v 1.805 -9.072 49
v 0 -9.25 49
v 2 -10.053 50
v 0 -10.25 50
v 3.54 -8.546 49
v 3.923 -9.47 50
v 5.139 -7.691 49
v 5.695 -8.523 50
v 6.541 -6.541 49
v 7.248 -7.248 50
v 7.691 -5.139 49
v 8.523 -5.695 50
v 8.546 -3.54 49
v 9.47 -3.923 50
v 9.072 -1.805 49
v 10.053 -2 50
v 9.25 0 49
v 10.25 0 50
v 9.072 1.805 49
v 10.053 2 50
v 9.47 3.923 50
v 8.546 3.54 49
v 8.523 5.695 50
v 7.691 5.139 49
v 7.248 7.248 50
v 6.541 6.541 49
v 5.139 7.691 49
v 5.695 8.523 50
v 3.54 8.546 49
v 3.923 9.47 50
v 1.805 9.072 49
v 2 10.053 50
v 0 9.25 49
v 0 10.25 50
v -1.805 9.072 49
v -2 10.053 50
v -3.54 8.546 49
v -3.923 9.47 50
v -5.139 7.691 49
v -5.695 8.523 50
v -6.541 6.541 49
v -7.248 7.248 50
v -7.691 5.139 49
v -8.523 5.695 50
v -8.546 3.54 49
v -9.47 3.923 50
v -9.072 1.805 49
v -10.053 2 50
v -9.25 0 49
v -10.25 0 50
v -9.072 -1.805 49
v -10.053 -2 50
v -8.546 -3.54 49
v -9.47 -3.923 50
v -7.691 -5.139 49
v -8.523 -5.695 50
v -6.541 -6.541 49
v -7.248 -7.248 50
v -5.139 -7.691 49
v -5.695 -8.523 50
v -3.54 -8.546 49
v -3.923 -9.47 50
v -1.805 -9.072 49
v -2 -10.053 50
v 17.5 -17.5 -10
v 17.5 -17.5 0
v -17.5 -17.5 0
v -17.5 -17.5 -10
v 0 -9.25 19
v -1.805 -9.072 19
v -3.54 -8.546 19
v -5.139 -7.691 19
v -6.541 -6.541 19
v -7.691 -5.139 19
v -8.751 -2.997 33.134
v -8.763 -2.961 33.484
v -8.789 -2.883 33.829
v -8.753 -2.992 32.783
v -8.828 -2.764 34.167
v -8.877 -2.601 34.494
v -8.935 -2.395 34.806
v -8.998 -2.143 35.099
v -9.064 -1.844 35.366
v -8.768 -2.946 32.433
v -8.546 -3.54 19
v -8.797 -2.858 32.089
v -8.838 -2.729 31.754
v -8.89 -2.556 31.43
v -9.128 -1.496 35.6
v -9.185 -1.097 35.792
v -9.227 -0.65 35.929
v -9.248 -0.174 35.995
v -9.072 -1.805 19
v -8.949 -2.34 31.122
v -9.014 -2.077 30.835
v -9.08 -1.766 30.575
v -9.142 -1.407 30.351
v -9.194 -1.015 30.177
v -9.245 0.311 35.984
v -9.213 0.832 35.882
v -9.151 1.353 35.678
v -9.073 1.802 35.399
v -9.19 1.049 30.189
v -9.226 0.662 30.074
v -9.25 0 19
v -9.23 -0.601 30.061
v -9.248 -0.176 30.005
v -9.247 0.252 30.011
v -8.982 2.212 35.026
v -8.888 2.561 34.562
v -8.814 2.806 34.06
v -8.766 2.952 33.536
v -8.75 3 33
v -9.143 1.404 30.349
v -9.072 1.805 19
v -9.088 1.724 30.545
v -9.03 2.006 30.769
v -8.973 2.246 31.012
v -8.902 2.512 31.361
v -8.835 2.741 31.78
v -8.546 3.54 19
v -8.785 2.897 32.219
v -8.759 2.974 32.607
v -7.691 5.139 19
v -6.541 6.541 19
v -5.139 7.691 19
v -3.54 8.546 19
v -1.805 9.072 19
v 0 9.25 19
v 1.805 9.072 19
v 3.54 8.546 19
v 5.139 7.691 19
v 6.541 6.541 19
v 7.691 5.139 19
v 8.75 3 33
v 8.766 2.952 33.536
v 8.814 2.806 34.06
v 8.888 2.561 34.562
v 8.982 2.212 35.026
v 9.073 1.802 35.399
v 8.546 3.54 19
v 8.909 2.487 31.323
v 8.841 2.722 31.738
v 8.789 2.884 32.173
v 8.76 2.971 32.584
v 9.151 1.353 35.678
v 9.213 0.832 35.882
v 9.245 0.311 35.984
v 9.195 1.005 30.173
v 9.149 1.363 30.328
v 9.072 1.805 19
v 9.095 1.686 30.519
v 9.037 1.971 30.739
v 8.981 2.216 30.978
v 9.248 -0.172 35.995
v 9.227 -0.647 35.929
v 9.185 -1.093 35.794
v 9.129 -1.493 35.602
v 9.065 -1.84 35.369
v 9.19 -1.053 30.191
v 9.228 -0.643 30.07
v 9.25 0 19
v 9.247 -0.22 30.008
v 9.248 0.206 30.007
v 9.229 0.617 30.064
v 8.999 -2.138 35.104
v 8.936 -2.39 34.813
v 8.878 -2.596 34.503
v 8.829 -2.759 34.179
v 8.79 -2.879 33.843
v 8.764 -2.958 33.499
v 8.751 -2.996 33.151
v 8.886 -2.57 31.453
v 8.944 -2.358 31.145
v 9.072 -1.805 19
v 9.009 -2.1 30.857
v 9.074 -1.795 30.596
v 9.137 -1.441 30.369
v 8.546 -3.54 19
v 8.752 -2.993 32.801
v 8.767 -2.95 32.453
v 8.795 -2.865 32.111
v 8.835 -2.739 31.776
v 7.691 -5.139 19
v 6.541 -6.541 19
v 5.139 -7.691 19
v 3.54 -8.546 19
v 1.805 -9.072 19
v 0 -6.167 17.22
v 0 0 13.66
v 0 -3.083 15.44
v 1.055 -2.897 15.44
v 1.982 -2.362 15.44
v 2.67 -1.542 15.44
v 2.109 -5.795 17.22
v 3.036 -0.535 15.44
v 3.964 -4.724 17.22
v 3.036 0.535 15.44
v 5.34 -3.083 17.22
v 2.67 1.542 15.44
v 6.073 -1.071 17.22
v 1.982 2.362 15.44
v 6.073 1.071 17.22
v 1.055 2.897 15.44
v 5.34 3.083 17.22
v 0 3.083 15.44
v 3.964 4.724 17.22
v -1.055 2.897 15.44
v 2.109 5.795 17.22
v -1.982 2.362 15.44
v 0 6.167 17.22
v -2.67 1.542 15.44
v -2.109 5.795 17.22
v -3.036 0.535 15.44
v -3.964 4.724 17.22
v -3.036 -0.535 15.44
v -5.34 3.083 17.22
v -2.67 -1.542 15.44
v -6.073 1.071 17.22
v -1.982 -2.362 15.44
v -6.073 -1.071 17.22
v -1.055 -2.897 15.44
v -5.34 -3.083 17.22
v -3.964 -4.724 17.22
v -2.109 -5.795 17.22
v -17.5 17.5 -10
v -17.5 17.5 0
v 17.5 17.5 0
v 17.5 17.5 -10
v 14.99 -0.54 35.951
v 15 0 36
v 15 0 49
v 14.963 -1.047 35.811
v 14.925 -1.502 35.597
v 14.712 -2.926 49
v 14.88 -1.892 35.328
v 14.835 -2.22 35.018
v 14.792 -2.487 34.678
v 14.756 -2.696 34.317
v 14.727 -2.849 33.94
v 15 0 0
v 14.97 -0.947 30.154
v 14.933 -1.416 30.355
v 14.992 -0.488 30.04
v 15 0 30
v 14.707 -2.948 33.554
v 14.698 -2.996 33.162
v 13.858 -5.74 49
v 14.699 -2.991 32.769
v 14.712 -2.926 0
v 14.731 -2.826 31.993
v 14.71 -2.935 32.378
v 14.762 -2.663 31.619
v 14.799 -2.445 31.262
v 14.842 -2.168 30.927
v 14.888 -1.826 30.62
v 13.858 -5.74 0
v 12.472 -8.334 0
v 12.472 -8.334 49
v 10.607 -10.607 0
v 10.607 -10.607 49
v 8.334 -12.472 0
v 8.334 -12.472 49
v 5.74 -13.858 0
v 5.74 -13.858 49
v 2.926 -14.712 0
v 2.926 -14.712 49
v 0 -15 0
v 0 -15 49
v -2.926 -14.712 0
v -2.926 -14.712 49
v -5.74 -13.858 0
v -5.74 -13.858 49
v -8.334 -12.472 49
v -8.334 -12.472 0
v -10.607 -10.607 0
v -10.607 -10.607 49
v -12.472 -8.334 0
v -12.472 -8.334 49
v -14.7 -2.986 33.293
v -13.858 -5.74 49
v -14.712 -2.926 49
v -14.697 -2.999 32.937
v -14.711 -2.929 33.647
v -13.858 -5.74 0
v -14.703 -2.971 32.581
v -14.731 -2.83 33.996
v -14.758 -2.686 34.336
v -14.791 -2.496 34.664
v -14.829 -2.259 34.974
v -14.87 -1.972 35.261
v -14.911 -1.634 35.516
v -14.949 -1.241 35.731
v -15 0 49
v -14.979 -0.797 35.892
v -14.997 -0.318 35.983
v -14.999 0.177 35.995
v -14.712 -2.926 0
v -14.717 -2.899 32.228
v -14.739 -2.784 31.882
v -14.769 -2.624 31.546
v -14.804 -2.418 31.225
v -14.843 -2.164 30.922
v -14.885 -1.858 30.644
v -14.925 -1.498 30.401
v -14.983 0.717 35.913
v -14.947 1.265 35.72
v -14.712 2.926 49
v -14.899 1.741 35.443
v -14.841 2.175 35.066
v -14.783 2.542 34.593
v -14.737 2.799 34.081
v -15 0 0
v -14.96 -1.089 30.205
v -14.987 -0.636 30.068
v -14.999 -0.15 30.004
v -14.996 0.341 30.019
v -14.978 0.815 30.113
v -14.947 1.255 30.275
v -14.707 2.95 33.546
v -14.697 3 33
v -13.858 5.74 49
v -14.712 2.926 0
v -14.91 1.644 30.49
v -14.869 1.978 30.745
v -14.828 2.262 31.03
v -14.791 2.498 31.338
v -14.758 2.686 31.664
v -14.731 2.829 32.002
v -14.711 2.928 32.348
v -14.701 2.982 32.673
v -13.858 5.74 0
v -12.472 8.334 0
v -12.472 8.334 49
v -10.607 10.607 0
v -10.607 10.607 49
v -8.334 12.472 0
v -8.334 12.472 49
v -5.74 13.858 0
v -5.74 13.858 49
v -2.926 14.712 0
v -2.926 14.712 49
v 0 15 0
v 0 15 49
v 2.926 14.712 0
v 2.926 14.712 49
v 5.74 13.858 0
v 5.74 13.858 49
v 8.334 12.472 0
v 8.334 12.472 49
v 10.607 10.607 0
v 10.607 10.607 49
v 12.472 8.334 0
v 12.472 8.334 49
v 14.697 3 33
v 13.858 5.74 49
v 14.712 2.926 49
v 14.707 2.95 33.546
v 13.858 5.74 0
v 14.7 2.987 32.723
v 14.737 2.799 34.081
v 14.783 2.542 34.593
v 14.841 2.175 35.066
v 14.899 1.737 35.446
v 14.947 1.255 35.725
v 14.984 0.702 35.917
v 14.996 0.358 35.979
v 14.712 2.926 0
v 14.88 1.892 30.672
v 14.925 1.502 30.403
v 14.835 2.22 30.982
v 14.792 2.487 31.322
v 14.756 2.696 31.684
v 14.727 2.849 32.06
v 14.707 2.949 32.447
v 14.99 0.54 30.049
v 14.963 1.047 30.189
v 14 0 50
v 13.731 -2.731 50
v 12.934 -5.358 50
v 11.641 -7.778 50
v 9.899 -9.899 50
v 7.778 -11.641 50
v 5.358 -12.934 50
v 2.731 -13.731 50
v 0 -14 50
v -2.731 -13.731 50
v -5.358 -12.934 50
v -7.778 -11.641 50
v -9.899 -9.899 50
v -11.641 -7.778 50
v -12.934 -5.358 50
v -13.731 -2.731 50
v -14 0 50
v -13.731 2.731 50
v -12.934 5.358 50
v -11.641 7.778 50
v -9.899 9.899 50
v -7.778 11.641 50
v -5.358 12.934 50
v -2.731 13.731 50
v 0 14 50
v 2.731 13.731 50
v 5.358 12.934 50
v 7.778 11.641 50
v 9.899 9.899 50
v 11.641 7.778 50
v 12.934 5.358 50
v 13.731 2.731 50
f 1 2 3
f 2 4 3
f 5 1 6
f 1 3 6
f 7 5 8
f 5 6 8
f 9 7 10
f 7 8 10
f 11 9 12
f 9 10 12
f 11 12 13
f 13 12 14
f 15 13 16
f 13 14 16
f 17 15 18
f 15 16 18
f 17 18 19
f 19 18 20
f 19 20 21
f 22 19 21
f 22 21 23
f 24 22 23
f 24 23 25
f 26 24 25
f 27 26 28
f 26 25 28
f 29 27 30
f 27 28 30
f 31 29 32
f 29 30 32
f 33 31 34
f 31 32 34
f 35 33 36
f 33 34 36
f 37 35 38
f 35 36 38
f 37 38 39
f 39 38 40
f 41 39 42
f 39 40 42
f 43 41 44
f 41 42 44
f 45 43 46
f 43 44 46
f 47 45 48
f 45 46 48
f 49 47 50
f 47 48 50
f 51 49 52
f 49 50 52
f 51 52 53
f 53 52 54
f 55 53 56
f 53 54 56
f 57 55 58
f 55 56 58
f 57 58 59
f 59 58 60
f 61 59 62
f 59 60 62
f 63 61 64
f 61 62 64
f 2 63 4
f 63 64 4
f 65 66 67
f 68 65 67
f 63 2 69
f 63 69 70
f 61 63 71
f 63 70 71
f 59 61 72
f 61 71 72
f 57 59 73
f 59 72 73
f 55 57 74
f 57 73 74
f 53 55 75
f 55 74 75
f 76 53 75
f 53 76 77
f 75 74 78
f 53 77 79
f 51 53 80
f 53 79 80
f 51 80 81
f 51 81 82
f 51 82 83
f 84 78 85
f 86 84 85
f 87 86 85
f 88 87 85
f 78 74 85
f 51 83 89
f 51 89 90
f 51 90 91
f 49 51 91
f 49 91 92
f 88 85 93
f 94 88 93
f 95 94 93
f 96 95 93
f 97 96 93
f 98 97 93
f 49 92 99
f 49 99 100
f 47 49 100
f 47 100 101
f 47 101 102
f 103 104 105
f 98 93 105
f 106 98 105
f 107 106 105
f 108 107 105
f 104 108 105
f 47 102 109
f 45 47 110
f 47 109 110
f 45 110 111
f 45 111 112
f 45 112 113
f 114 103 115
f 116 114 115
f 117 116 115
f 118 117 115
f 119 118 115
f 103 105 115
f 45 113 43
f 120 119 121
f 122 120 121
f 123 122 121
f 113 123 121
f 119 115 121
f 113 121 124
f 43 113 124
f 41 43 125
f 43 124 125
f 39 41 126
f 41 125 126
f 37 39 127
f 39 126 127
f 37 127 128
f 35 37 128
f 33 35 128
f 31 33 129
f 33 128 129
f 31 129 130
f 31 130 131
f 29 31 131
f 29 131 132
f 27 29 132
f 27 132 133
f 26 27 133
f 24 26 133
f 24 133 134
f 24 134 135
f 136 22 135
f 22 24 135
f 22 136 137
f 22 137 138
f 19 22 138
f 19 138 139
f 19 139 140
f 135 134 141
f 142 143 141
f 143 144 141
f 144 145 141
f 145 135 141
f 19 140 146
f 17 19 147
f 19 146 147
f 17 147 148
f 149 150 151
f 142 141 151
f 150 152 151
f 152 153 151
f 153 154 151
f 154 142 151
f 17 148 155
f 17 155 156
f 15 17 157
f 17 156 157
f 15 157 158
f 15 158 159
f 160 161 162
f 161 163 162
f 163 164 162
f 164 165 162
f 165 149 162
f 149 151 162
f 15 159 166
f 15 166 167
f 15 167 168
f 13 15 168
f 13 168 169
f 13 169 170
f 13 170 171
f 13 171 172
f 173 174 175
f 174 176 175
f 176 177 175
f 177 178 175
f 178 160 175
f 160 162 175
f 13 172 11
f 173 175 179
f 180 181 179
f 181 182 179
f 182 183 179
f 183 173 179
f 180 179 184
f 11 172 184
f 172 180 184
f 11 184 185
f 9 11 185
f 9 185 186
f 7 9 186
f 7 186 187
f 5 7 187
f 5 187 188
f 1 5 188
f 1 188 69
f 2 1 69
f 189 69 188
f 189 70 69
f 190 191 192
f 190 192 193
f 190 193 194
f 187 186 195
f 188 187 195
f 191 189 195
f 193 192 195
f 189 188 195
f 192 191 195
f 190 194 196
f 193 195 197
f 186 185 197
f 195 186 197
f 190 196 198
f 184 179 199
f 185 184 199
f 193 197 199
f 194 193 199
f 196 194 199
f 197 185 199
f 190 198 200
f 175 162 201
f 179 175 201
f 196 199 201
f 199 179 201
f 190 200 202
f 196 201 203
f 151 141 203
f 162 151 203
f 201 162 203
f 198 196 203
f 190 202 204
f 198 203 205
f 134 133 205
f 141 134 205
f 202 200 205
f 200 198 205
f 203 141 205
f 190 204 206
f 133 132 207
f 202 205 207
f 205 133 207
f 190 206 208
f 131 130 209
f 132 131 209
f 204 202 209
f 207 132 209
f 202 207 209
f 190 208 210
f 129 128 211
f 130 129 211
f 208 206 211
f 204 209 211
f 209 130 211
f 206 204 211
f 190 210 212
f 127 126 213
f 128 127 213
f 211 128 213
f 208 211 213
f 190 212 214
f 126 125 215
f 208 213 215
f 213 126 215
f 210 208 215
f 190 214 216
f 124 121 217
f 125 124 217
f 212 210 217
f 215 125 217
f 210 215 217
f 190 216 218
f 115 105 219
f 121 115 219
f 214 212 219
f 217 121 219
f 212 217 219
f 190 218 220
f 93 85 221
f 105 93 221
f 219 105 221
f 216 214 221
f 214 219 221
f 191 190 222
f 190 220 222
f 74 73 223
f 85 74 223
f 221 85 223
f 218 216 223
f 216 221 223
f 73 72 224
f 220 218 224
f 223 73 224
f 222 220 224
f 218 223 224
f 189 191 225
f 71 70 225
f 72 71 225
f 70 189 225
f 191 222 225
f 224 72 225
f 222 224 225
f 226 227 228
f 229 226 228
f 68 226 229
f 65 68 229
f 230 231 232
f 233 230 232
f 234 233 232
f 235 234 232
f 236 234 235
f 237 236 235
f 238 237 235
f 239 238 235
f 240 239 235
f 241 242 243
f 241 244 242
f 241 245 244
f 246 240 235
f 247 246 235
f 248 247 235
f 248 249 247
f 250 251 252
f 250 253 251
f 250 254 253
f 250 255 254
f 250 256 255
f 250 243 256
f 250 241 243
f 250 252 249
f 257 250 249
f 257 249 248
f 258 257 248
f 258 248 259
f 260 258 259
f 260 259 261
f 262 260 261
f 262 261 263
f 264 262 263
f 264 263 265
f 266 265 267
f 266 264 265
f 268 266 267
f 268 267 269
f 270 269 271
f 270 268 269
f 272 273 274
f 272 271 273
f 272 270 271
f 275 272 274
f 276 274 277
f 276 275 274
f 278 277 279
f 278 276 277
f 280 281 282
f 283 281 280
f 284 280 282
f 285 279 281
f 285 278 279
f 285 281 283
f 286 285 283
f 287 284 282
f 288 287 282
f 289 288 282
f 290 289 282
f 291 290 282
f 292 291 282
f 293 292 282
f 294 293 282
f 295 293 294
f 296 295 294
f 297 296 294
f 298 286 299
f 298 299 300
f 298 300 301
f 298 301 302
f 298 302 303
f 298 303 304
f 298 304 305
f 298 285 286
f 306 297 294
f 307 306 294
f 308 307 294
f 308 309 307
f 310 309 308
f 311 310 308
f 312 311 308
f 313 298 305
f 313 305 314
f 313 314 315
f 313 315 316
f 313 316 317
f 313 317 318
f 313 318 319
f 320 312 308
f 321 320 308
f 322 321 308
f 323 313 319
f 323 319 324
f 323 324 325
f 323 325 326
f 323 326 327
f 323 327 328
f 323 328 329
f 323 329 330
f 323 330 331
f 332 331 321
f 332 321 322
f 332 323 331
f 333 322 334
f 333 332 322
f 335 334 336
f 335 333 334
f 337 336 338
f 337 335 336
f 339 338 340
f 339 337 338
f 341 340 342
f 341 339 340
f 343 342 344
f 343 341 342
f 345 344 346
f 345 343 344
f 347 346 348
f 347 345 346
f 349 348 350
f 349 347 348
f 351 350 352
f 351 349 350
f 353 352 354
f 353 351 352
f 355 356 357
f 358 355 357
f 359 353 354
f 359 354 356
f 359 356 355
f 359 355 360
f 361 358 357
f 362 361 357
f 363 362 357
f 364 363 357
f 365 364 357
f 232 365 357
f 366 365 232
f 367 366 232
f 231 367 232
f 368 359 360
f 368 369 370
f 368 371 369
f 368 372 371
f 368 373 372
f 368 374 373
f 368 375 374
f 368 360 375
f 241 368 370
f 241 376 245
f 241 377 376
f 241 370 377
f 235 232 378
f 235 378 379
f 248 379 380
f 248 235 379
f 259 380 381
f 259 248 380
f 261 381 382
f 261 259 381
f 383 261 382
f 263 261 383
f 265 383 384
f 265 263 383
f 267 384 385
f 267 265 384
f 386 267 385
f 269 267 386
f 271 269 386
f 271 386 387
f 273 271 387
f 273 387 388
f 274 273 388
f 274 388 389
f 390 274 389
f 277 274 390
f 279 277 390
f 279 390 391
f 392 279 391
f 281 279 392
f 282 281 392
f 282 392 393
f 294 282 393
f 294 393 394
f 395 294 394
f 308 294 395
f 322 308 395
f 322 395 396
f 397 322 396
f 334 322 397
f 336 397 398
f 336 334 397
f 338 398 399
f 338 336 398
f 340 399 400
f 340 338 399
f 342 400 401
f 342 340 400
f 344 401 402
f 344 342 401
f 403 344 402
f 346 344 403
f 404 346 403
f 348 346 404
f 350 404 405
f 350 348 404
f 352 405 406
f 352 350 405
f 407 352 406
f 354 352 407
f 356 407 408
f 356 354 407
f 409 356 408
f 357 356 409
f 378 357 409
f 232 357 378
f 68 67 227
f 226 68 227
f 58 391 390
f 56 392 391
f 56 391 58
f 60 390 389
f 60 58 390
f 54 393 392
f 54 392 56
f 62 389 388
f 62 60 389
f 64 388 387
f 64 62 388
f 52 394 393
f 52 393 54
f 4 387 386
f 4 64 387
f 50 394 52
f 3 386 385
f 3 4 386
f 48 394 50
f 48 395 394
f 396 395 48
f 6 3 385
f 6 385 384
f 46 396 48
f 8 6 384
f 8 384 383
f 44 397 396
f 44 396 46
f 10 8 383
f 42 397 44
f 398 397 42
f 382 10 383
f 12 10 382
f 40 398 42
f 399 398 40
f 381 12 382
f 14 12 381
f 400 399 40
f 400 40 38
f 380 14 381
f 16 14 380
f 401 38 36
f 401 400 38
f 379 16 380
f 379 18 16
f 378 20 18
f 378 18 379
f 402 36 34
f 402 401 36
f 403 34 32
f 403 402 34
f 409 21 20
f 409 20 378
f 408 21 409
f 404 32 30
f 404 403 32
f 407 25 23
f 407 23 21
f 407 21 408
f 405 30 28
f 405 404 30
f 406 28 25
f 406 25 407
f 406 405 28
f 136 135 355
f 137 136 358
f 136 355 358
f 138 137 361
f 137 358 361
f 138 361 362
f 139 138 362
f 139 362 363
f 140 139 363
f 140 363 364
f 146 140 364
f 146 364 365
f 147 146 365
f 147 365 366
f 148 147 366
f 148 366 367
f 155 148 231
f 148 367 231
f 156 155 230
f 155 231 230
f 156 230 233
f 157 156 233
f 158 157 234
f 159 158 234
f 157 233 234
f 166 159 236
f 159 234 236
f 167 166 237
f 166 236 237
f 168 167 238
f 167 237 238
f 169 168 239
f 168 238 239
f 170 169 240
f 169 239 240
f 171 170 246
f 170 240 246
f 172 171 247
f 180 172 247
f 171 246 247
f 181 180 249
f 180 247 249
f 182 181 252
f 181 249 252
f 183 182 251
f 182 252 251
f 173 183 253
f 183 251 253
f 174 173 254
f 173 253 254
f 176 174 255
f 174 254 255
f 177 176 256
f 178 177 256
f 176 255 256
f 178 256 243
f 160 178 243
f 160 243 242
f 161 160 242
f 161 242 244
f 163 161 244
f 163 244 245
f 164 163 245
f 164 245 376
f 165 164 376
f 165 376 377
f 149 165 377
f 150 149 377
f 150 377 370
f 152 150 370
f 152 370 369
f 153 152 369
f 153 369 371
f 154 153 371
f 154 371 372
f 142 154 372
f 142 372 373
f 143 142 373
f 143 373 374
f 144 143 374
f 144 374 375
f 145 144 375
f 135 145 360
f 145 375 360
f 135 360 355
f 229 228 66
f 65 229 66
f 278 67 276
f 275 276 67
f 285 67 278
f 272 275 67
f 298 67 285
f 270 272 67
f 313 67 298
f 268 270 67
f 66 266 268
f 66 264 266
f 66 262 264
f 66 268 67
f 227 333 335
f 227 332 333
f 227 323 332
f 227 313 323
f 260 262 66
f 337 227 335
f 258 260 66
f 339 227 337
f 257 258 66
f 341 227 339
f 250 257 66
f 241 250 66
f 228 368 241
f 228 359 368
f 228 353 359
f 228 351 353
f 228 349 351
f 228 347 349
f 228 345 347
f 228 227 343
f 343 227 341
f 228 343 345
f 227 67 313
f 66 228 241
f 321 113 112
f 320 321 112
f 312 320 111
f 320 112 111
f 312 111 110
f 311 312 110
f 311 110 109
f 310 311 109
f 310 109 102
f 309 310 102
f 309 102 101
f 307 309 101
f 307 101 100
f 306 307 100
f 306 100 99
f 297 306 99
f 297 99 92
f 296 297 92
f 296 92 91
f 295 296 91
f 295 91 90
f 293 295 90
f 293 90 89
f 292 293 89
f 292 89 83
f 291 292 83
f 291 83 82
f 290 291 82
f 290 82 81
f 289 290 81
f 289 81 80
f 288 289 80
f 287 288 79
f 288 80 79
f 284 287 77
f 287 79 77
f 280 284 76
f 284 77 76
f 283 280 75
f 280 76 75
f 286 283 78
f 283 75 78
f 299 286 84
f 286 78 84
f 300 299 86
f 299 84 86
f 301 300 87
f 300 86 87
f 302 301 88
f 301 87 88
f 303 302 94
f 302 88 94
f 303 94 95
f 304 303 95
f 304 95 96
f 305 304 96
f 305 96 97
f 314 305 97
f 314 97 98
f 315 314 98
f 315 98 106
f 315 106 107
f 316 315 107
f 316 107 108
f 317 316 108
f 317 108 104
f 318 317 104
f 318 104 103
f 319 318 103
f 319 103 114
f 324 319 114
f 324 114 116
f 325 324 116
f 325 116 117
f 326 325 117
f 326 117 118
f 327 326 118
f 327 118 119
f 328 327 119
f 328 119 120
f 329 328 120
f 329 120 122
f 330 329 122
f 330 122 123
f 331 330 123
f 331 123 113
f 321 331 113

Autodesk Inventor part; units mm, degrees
ref_plane "YZ Plane" through (0, 0, 0) normal (1, 0, 0) x (0, 1, 0)
ref_plane "XZ Plane" through (0, 0, 0) normal (0, 1, 0) x (-1, 0, 0)
ref_plane "XY Plane" through (0, 0, 0) normal (0, 0, 1) x (1, 0, 0)
sketch "Эскиз1" plane through (0, 0, 0) normal (0, 0, 1) x (1, 0, 0)
  line L0 (17.5, -17.5) -> (-17.5, -17.5)
  line L1 (-17.5, -17.5) -> (-17.5, 17.5)
  line L2 (-17.5, 17.5) -> (17.5, 17.5)
  line L3 (17.5, 17.5) -> (17.5, -17.5)
  line L4 (17.5, -17.5) -> (-17.5, 17.5) construction
  line L5 (-17.5, -17.5) -> (17.5, 17.5) construction
  point P0 (0, 0)
  dimension "d0" = 35
  dimension "d1" = 35
extrude "Выдавливание1" add sketch "Эскиз1" against normal blind 10
sketch "Эскиз2" plane through (0, 0, 0) normal (0, 0, 1) x (1, 0, 0)
  circle A0 centre (0, 0) radius 15
  dimension "d4" = 30
extrude "Выдавливание2" add sketch "Эскиз2" along normal blind 50
sketch "Эскиз3" plane through (0, 0, 50) normal (0, 0, 1) x (1, 0, 0)
  point P0 (0, 0)
  point P1 (0, 0)
hole "Отверстие1" at (0, 0, 50) direction (0, 0, -1) diameter 18.5 depth 31 tip angle 120
sketch "Эскиз4" plane through (0, 0, 0) normal (1, 0, 0) x (0, 1, 0)
  circle A0 centre (0, 33) radius 3
  line L0 (0, -22) -> (0, 62) projected
  line L1 (17.5, 0) -> (-17.5, 0) projected
  line L2 (15, 50) -> (-15, 50) projected
  point P0 (0, 0)
  dimension "d14" = 6
  dimension "d15" = 17
extrude "Выдавливание3" cut sketch "Эскиз4" along normal mid plane 50
chamfer "Фаска1" distance 1 angle 45 2 edges at (-15, 0, 50) (0, 9.25, 50)
properties part number "Инж_граф_1"
